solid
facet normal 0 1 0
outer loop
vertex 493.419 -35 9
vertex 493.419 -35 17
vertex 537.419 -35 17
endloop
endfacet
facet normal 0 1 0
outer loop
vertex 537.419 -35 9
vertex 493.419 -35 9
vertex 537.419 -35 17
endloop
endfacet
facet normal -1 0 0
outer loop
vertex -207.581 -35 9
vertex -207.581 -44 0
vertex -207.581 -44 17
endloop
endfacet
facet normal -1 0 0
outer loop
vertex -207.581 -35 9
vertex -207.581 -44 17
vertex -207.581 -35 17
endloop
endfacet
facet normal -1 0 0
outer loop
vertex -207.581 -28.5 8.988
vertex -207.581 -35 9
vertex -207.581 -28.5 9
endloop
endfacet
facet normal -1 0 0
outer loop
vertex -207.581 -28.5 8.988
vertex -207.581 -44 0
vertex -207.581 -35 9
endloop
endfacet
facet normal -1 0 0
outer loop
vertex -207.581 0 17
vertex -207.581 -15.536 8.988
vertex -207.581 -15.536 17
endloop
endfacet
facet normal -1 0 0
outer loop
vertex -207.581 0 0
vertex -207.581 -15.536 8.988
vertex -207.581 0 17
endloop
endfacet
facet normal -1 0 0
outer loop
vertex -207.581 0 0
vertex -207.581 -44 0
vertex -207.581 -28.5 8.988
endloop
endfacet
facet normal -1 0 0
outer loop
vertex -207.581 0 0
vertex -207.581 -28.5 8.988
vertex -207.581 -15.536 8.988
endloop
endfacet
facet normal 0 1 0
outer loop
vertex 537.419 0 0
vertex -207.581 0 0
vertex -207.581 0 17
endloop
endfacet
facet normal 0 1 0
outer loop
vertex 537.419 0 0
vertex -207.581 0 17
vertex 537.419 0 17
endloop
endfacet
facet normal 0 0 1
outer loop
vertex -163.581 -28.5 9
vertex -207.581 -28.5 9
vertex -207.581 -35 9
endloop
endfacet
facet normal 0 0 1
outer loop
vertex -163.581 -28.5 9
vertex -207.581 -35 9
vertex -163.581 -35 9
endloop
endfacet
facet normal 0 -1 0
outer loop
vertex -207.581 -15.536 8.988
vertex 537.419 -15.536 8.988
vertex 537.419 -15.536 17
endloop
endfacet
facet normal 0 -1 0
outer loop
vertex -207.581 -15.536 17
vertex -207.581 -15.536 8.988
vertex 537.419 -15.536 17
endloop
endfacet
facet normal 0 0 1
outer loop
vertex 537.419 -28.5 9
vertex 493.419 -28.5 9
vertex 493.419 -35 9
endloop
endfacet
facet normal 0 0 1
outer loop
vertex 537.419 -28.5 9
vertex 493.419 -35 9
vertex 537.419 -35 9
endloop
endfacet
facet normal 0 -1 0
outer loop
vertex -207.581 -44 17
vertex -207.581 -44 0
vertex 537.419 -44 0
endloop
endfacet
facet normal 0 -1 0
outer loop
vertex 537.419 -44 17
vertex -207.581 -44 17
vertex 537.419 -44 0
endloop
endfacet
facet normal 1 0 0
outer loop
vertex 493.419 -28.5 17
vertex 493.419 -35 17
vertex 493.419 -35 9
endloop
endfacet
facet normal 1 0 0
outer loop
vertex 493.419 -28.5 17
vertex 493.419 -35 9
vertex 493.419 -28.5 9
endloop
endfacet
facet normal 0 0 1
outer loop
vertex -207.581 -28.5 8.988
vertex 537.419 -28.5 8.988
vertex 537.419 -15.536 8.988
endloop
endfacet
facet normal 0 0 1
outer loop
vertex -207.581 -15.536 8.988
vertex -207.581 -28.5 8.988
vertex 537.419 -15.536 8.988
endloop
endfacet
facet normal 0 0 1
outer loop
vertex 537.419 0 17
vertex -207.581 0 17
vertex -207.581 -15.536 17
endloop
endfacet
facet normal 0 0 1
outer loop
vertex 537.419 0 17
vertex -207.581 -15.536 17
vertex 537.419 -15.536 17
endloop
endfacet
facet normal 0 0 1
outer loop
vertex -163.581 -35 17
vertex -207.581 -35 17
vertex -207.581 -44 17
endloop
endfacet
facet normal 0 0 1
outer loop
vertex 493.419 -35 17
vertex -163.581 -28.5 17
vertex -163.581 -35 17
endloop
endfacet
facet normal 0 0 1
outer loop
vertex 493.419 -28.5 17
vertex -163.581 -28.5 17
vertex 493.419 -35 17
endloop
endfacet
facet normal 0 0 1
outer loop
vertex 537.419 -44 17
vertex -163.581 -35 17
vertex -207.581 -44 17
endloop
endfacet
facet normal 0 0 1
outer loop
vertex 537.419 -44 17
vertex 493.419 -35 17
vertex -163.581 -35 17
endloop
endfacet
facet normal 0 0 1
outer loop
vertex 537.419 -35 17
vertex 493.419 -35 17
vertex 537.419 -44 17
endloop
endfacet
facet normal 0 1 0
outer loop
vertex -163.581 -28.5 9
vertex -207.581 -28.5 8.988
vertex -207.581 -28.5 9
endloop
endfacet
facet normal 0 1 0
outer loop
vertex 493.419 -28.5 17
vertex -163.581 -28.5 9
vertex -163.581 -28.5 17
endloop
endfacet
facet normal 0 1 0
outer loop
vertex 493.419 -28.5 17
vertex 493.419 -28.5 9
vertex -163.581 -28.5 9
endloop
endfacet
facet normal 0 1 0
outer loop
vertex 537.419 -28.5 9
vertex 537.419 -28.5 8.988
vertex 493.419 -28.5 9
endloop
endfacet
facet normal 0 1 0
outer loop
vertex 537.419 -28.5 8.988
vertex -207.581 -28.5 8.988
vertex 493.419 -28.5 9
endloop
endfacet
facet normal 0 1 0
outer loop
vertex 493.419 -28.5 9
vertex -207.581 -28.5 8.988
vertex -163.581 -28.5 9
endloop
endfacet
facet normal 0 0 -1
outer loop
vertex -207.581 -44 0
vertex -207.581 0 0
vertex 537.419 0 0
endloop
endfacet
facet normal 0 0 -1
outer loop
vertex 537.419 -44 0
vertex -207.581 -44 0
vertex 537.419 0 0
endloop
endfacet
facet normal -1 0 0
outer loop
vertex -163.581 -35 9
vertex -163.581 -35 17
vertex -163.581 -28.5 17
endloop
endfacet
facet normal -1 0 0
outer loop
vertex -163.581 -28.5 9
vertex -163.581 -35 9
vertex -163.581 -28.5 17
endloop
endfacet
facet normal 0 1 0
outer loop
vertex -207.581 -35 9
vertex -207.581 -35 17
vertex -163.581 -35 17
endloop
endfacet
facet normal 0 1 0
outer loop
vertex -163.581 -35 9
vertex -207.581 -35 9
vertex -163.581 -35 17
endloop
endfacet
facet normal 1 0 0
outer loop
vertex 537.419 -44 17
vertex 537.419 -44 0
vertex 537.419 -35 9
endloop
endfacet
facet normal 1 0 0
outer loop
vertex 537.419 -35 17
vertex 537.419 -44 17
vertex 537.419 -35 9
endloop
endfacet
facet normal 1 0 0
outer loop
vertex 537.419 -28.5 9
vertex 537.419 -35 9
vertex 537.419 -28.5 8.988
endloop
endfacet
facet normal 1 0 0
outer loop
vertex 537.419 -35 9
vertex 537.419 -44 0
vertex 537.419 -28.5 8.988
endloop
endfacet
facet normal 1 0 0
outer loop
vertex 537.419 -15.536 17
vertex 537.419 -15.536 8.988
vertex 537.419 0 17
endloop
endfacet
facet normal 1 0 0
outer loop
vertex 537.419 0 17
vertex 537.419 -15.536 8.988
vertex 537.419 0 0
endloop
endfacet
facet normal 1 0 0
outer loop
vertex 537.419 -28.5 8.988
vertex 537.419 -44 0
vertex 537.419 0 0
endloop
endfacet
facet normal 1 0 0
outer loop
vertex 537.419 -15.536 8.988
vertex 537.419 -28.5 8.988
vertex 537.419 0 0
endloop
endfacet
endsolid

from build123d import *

# Parameters (mm, degrees)
F0_W     = 745
F0_H     = 44
F1_DEPTH = 17
F2_W     = 12.964161098
F2_H     = 8.0115068778
F3_DEPTH = 745
F4_W     = 44
F4_H     = 6.5
F5_DEPTH = 8
F6_W     = 44
F6_H     = 6.5
F7_DEPTH = 8


with BuildPart() as f1:
    # F0 (on Top) → F1 (new body)
    with BuildSketch(Plane.XY):
        with Locations((164.9187269809, -22)):
            Rectangle(F0_W, F0_H)
    extrude(amount=F1_DEPTH)

    # F2 (on face) → F3 (cut)
    with BuildSketch(Plane.YZ.offset(537.4187269809)):
        with Locations((-22.017919451, 12.9942465611)):
            Rectangle(F2_W, F2_H)
    extrude(amount=-F3_DEPTH, mode=Mode.SUBTRACT)

    # F4 (on face) → F5 (cut)
    with BuildSketch(Plane.XY.offset(17)):
        with Locations((515.4187269809, -31.75)):
            Rectangle(F4_W, F4_H)
    extrude(amount=-F5_DEPTH, mode=Mode.SUBTRACT)

    # F6 (on face) → F7 (cut)
    with BuildSketch(Plane.XY.offset(17)):
        with Locations((-185.5812730191, -31.75)):
            Rectangle(F6_W, F6_H)
    extrude(amount=-F7_DEPTH, mode=Mode.SUBTRACT)


solid = f1.part
